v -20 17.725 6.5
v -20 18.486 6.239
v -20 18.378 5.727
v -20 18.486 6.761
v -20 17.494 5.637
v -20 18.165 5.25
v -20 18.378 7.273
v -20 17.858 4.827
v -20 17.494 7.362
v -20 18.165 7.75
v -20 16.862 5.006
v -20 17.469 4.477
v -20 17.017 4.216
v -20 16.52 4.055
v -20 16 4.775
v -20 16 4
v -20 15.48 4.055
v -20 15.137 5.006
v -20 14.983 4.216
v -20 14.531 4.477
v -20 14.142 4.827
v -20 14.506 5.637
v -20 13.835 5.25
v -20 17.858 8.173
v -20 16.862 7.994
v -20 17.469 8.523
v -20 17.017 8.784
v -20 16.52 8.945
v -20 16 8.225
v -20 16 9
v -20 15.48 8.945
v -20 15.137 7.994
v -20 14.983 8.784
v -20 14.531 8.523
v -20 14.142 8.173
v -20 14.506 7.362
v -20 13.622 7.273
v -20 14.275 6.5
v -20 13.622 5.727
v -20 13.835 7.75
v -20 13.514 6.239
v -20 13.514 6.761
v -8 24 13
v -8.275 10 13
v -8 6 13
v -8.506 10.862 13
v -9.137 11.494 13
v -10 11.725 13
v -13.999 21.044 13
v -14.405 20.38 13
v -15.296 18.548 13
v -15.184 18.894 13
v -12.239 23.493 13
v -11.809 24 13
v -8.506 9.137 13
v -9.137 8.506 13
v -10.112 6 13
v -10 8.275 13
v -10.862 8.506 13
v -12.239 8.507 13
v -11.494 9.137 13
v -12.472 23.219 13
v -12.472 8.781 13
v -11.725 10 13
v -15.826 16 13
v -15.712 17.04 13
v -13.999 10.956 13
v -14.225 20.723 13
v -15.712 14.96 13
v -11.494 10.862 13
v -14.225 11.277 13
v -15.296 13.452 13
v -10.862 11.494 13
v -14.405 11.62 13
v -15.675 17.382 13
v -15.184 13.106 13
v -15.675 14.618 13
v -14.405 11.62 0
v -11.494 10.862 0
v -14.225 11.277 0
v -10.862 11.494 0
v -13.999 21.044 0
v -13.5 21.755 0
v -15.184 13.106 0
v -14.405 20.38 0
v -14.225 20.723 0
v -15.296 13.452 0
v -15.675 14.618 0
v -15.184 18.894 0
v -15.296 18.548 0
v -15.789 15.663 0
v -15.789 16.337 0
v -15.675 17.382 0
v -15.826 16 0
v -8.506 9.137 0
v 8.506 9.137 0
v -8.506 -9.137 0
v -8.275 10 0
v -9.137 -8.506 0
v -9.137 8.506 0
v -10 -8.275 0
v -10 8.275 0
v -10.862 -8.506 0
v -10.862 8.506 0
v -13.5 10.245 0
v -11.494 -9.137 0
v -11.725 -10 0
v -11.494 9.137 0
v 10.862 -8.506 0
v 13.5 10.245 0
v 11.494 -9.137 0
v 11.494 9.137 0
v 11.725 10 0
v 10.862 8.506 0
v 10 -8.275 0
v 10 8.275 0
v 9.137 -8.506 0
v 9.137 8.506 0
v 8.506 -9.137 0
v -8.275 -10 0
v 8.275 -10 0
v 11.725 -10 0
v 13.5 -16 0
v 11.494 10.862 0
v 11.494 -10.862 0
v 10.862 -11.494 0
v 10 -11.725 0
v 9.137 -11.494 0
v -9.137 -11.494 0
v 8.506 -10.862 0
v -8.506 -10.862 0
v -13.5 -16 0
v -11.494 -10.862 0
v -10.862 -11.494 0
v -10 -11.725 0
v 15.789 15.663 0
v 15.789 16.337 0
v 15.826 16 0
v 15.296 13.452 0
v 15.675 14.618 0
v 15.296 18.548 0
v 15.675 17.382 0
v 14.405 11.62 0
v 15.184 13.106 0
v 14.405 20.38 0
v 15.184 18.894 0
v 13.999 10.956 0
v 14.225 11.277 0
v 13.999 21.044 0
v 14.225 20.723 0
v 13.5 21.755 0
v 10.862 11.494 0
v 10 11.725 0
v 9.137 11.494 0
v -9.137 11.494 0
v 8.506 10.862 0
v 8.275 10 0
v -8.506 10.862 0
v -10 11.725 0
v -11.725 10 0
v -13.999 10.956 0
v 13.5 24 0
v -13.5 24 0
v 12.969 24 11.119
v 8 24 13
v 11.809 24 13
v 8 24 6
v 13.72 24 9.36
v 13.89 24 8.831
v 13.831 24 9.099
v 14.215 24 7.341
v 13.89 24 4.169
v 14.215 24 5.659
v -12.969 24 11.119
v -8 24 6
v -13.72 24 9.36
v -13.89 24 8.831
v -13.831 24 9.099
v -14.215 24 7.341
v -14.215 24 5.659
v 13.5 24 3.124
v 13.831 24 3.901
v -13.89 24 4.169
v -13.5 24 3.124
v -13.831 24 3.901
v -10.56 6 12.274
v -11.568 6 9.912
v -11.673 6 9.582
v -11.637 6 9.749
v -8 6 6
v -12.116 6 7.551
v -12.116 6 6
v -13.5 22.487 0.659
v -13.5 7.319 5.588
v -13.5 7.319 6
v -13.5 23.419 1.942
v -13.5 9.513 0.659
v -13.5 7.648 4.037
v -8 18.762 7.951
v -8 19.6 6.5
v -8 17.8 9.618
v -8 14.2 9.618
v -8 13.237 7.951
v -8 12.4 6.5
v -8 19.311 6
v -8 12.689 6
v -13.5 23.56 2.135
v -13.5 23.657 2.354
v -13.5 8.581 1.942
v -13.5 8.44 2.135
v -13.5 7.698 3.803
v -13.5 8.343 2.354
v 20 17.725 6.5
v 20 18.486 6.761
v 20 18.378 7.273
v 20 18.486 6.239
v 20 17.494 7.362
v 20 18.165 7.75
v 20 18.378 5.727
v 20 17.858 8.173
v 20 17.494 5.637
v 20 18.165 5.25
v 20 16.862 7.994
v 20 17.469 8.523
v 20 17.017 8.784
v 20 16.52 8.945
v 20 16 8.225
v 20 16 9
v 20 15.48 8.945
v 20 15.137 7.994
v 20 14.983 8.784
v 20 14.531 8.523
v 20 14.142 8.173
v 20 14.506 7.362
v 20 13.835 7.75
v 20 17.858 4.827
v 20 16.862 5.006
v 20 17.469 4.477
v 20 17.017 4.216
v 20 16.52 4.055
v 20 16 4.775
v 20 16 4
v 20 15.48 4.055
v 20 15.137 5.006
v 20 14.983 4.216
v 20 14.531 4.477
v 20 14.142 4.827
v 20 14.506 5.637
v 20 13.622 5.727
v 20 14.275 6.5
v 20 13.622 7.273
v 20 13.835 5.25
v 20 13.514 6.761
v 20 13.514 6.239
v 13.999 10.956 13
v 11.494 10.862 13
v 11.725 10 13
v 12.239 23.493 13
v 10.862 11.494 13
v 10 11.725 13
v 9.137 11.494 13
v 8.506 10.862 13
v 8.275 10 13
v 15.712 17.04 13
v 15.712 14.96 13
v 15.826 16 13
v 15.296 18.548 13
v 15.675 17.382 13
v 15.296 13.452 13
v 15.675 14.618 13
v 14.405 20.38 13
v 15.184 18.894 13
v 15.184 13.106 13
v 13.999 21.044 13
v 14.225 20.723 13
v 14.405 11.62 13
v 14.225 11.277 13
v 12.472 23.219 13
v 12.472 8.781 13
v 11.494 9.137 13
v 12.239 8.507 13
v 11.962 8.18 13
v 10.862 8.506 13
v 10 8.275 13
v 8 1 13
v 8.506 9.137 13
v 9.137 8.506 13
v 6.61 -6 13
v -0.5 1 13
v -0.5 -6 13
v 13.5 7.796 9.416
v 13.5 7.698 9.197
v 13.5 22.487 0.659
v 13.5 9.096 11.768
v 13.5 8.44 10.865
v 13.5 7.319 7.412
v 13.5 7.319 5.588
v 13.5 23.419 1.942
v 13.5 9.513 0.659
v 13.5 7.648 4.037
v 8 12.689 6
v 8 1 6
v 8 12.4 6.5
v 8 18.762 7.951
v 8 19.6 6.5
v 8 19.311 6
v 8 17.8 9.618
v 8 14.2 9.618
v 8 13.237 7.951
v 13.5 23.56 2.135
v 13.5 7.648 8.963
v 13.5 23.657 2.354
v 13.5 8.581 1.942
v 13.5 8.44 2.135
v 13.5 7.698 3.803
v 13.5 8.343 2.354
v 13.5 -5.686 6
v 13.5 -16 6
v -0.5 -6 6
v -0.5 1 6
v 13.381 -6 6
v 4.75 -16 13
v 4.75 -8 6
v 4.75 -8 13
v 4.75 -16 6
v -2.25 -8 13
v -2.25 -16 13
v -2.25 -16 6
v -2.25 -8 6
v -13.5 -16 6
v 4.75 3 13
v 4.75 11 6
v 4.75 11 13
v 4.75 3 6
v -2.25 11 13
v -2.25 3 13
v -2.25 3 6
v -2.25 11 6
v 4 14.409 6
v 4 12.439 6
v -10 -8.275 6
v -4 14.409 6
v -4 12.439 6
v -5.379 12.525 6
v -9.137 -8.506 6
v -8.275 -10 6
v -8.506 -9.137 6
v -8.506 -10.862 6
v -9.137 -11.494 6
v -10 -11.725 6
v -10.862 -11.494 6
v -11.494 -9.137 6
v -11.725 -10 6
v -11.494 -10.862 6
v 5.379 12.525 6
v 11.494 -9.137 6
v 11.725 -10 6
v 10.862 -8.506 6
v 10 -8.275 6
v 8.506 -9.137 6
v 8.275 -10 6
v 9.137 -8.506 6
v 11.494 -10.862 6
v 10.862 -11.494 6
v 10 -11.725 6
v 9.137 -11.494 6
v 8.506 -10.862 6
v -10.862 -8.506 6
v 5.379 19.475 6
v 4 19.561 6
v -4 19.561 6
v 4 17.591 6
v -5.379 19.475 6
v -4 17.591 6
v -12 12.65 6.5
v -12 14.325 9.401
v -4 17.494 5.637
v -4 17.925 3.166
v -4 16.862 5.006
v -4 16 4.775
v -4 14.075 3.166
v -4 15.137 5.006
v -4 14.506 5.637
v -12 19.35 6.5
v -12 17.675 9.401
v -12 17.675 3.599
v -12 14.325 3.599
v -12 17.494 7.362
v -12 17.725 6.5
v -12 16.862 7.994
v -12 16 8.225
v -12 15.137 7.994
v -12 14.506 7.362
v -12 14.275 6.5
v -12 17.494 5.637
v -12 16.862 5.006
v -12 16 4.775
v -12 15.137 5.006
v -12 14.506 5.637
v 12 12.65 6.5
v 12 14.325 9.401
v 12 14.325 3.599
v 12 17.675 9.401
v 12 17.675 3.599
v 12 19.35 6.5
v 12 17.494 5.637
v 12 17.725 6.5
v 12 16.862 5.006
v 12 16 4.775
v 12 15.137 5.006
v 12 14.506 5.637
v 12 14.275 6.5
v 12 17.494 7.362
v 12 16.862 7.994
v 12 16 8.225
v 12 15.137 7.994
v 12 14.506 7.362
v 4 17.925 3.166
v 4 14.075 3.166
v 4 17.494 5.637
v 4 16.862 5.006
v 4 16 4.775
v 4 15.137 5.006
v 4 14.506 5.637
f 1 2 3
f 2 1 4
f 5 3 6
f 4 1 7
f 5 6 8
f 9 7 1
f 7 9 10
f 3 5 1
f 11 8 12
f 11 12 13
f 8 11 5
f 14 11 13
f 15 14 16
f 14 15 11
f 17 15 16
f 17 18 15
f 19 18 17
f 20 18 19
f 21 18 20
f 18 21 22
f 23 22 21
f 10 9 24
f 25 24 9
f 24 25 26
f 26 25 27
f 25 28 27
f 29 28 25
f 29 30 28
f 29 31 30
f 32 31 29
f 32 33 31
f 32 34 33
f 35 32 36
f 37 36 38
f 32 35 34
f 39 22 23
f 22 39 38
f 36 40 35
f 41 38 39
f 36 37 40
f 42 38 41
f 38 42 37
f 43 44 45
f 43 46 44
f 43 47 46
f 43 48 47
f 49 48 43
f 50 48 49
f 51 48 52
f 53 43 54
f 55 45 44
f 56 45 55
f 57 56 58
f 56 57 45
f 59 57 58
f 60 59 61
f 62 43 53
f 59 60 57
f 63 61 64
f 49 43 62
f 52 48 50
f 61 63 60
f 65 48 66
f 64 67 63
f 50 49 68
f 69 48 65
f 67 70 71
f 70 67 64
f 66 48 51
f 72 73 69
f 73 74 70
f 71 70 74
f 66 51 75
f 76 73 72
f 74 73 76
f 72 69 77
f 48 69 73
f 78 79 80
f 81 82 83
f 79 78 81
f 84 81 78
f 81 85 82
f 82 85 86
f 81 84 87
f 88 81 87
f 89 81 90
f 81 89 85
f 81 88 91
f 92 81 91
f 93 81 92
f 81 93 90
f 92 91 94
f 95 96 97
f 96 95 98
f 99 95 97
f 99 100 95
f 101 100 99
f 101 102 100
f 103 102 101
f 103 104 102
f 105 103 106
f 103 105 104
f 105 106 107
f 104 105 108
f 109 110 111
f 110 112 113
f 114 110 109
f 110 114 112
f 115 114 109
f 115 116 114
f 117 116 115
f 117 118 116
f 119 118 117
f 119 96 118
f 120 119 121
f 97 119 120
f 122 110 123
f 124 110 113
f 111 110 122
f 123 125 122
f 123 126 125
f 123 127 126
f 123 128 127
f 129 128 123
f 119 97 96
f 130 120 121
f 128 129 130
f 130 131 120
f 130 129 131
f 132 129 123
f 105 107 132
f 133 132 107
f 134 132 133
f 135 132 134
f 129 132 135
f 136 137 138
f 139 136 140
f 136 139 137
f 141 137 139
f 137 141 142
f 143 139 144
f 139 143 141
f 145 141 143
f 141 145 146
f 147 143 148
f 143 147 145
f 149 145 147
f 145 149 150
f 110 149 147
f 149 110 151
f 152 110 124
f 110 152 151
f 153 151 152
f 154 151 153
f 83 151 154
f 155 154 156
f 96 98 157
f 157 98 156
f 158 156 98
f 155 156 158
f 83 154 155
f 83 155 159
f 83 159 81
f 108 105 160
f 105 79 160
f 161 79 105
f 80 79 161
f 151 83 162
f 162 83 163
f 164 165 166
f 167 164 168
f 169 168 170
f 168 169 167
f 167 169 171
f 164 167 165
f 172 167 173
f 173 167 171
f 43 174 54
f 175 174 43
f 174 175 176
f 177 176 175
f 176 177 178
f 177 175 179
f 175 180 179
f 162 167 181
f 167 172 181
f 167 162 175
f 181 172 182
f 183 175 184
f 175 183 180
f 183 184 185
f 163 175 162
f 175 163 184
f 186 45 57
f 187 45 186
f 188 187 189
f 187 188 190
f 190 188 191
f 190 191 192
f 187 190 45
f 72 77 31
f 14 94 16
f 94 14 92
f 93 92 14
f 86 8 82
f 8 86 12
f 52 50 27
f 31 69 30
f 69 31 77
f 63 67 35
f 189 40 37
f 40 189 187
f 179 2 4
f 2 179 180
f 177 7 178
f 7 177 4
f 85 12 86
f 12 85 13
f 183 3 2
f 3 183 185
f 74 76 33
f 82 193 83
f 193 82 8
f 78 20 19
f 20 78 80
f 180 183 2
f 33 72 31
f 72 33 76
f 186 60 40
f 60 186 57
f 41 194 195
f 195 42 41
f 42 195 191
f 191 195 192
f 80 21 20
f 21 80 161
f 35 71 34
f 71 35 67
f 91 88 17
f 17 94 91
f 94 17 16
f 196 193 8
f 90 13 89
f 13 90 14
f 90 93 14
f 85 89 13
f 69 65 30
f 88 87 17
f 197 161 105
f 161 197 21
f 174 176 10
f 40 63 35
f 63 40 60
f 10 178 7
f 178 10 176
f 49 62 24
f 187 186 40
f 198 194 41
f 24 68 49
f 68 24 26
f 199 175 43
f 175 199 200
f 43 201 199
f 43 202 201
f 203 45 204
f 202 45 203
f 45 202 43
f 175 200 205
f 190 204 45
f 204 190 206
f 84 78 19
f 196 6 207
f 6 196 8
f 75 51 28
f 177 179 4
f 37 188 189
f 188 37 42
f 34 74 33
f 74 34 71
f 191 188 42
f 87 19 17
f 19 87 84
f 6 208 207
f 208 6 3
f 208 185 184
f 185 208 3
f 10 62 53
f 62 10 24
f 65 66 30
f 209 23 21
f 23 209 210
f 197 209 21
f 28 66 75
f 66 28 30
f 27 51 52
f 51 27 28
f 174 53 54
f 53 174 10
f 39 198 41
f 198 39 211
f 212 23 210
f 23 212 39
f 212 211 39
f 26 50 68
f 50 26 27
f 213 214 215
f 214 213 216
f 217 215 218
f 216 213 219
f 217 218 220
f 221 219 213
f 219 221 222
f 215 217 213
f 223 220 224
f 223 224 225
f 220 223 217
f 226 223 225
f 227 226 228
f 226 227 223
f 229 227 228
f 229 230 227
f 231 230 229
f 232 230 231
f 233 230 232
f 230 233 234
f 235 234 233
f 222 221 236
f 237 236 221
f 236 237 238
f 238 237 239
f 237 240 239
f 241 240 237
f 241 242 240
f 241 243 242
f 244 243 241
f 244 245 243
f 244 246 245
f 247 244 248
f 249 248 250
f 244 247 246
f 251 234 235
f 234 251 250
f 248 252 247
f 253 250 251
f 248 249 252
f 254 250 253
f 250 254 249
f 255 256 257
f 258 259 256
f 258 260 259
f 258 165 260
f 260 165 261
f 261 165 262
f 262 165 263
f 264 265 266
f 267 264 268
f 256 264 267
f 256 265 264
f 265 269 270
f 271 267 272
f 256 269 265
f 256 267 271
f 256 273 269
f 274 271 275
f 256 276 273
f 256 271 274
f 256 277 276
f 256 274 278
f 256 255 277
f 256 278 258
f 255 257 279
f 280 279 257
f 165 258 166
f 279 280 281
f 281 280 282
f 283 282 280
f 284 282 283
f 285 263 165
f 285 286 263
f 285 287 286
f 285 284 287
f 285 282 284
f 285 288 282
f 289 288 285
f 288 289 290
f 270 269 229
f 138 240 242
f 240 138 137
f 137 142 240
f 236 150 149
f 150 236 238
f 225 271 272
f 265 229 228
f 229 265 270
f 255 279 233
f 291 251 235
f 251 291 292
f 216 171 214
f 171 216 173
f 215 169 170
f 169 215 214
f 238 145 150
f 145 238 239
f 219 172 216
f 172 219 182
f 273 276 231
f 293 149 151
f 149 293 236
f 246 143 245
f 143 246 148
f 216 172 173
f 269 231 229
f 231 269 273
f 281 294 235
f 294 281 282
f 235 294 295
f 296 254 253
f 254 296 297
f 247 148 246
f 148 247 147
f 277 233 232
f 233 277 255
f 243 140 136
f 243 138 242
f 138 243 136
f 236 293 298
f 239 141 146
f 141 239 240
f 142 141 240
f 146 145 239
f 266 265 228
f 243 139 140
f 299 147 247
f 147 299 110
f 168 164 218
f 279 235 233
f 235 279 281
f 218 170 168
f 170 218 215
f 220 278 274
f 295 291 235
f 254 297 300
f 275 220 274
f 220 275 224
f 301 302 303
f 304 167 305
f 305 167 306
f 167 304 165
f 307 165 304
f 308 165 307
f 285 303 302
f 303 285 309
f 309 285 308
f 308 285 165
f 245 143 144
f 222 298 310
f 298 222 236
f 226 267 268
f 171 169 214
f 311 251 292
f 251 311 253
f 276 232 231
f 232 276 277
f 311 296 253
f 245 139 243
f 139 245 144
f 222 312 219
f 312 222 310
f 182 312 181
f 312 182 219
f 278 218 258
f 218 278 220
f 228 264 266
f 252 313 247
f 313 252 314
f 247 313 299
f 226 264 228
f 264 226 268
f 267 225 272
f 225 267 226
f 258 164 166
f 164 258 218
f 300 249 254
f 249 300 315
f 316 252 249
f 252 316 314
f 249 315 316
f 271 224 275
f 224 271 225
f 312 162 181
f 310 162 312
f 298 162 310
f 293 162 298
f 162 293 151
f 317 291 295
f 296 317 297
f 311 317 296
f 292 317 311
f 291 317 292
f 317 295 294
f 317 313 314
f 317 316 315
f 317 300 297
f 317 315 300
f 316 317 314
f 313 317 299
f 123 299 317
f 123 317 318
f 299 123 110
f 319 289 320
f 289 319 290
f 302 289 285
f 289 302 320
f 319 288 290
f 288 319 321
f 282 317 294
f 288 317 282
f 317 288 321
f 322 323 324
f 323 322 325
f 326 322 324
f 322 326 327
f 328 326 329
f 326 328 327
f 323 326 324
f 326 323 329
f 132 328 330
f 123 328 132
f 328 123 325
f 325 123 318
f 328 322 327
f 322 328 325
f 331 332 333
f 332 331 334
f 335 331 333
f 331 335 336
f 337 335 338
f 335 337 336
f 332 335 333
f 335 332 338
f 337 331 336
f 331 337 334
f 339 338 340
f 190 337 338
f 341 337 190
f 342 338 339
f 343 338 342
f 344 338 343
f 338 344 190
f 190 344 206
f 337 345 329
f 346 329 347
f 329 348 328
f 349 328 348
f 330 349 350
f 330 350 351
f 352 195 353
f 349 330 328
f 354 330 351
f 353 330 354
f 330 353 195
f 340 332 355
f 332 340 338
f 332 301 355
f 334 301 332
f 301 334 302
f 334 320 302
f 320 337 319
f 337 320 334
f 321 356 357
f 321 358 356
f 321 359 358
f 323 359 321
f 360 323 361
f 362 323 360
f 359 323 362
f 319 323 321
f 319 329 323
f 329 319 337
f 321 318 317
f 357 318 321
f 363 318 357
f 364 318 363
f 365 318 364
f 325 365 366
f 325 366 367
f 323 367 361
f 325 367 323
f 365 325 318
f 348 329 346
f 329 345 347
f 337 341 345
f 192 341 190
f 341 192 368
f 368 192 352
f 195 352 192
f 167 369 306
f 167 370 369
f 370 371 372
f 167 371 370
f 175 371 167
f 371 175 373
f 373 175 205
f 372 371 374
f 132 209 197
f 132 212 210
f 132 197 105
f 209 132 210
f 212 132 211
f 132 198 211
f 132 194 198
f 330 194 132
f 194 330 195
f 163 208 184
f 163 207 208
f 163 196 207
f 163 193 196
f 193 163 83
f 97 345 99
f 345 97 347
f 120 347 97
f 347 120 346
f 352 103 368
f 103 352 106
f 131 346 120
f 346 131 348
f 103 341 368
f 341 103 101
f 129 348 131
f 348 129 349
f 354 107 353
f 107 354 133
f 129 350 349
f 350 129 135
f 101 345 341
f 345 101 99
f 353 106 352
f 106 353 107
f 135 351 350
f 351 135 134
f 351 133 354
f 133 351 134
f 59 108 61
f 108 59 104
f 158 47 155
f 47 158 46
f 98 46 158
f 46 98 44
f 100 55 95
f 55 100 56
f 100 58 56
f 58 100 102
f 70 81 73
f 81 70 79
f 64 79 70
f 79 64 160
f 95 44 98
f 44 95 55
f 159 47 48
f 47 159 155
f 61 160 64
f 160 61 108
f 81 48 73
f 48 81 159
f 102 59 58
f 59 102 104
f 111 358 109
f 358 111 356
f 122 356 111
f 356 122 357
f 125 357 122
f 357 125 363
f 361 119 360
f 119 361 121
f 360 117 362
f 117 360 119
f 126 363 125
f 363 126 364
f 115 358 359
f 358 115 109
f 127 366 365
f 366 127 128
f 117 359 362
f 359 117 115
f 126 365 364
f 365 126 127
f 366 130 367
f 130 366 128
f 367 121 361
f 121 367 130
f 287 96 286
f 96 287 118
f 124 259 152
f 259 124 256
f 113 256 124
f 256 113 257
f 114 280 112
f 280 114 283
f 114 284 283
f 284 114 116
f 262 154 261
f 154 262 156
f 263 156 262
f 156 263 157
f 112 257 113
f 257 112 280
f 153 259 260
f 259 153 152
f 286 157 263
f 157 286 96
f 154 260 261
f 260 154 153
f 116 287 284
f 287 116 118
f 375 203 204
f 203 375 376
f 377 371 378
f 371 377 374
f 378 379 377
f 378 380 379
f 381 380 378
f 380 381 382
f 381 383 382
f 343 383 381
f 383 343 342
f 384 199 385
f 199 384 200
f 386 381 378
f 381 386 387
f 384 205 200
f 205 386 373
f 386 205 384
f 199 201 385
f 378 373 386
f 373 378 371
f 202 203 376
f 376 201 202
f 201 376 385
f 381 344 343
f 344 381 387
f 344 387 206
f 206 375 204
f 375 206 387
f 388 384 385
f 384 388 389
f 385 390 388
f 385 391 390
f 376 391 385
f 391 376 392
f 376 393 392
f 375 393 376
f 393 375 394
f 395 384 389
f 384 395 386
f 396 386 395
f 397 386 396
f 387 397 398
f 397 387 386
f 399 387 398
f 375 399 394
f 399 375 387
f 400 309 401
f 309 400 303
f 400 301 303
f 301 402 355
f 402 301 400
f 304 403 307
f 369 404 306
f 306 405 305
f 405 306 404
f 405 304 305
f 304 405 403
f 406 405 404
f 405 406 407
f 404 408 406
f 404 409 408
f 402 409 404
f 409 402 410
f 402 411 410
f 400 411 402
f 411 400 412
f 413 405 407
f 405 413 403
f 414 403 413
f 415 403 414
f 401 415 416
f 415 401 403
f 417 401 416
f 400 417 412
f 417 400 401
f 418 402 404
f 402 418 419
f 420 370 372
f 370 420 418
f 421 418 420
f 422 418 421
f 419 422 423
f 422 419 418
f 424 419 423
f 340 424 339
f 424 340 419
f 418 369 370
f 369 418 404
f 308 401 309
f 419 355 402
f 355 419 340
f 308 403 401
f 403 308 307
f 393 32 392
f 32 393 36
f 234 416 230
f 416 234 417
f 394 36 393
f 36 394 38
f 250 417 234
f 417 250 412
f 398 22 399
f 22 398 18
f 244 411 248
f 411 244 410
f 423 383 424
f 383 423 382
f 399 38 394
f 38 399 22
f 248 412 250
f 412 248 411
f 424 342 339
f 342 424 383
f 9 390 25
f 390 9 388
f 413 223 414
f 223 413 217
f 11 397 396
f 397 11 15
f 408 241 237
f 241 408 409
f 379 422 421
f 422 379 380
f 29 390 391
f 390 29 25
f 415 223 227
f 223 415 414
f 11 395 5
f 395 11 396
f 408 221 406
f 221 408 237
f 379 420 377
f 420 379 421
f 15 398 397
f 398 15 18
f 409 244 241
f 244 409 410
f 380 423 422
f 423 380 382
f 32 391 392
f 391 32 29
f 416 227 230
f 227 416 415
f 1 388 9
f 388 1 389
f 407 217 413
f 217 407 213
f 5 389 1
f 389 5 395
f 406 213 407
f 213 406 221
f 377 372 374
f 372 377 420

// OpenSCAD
// file: configuration.scad
// Increase this if your slicer or printer make holes too tight.
extra_radius = 0.1;

// OD = outside diameter, corner to corner.
m3_nut_od = 6.1;
m3_nut_radius = m3_nut_od/2 + 0.2 + extra_radius;
m3_washer_radius = 3.5 + extra_radius;

// Major diameter of metric 3mm thread.
m3_major = 2.85;
m3_radius = m3_major/2 + extra_radius;
m3_wide_radius = m3_major/2 + extra_radius + 0.2;
// For M3 holes that needs to be tapped in the plastic
m3_tap_radius = 2.5/2 + extra_radius;

// NEMA17 stepper motors.
motor_shaft_diameter = 5;
motor_shaft_radius = motor_shaft_diameter/2 + extra_radius;

// Frame brackets. M3x8mm screws work best with 3.6 mm brackets.
thickness = 3.6;

// OpenBeam or Misumi. Currently only 15x15 mm, but there is a plan
// to make models more parametric and allow 20x20 mm in the future.
extrusion = 15;

// Placement for the NEMA17 stepper motors.
motor_offset = 44;
motor_length = 47;
// main file
include <configuration.scad>;

// Separation between the rod end mounbting edges.
separation = 40;
thickness = 6;

horn_thickness = 13;
horn_x = 8;

belt_width = 5;
belt_x = 5.6;
belt_z = 7;

module carriage() {
  // Timing belt (up and down).
  translate([-belt_x, 0, belt_z + belt_width/2]) %
    cube([1.7, 100, belt_width], center=true);
  translate([belt_x, 0, belt_z + belt_width/2]) %
    cube([1.7, 100, belt_width], center=true);
  difference() {
    union() {
      // Main body.
      translate([0, 4, thickness/2])
        #cube([27, 40, thickness], center=true);
      // Ball joint mount horns.
      for (x = [-1, 1]) {
        scale([x, 1, 1]) intersection() {
          translate([0, 15, horn_thickness/2])
            cube([separation, 18, horn_thickness], center=true);
          translate([horn_x, 16, horn_thickness/2]) rotate([0, 90, 0])
            cylinder(r1=14, r2=2.5, h=separation/2-horn_x);
        }
      }
      // Belt clamps.
      difference() {
        union() {
          translate([6.5, -2.5, horn_thickness/2+1])
            cube([14, 7, horn_thickness-2], center=true);
          translate([10.75, 2.5, horn_thickness/2+1])
            cube([5.5, 16, horn_thickness-2], center=true);
        }
        // Avoid touching diagonal push rods (carbon tube).
        translate([20, -10, 12.5]) rotate([35, 35, 30])
          cube([40, 40, 20], center=true);
      }
      for (y = [-12, 7]) {
        translate([1.25, y, horn_thickness/2+1])
          cube([7, 8, horn_thickness-2], center=true);
      }
    }
    // Screws for linear slider.
    for (x = [-10, 10]) {
      for (y = [-10, 10]) {
        translate([x, y, thickness]) #
          cylinder(r=m3_wide_radius, h=30, center=true, $fn=12);
      }
    }
    // Screws for ball joints.
    translate([0, 16, horn_thickness/2]) rotate([0, 90, 0]) #
      cylinder(r=m3_wide_radius, h=60, center=true, $fn=12);
    // Lock nuts for ball joints.
    for (x = [-1, 1]) {
      scale([x, 1, 1]) intersection() {
        translate([horn_x, 16, horn_thickness/2]) rotate([90, 0, -90])
          cylinder(r1=m3_nut_radius, r2=m3_nut_radius+0.5, h=8,
                   center=true, $fn=6);
      }
    }
  }
}

carriage();
